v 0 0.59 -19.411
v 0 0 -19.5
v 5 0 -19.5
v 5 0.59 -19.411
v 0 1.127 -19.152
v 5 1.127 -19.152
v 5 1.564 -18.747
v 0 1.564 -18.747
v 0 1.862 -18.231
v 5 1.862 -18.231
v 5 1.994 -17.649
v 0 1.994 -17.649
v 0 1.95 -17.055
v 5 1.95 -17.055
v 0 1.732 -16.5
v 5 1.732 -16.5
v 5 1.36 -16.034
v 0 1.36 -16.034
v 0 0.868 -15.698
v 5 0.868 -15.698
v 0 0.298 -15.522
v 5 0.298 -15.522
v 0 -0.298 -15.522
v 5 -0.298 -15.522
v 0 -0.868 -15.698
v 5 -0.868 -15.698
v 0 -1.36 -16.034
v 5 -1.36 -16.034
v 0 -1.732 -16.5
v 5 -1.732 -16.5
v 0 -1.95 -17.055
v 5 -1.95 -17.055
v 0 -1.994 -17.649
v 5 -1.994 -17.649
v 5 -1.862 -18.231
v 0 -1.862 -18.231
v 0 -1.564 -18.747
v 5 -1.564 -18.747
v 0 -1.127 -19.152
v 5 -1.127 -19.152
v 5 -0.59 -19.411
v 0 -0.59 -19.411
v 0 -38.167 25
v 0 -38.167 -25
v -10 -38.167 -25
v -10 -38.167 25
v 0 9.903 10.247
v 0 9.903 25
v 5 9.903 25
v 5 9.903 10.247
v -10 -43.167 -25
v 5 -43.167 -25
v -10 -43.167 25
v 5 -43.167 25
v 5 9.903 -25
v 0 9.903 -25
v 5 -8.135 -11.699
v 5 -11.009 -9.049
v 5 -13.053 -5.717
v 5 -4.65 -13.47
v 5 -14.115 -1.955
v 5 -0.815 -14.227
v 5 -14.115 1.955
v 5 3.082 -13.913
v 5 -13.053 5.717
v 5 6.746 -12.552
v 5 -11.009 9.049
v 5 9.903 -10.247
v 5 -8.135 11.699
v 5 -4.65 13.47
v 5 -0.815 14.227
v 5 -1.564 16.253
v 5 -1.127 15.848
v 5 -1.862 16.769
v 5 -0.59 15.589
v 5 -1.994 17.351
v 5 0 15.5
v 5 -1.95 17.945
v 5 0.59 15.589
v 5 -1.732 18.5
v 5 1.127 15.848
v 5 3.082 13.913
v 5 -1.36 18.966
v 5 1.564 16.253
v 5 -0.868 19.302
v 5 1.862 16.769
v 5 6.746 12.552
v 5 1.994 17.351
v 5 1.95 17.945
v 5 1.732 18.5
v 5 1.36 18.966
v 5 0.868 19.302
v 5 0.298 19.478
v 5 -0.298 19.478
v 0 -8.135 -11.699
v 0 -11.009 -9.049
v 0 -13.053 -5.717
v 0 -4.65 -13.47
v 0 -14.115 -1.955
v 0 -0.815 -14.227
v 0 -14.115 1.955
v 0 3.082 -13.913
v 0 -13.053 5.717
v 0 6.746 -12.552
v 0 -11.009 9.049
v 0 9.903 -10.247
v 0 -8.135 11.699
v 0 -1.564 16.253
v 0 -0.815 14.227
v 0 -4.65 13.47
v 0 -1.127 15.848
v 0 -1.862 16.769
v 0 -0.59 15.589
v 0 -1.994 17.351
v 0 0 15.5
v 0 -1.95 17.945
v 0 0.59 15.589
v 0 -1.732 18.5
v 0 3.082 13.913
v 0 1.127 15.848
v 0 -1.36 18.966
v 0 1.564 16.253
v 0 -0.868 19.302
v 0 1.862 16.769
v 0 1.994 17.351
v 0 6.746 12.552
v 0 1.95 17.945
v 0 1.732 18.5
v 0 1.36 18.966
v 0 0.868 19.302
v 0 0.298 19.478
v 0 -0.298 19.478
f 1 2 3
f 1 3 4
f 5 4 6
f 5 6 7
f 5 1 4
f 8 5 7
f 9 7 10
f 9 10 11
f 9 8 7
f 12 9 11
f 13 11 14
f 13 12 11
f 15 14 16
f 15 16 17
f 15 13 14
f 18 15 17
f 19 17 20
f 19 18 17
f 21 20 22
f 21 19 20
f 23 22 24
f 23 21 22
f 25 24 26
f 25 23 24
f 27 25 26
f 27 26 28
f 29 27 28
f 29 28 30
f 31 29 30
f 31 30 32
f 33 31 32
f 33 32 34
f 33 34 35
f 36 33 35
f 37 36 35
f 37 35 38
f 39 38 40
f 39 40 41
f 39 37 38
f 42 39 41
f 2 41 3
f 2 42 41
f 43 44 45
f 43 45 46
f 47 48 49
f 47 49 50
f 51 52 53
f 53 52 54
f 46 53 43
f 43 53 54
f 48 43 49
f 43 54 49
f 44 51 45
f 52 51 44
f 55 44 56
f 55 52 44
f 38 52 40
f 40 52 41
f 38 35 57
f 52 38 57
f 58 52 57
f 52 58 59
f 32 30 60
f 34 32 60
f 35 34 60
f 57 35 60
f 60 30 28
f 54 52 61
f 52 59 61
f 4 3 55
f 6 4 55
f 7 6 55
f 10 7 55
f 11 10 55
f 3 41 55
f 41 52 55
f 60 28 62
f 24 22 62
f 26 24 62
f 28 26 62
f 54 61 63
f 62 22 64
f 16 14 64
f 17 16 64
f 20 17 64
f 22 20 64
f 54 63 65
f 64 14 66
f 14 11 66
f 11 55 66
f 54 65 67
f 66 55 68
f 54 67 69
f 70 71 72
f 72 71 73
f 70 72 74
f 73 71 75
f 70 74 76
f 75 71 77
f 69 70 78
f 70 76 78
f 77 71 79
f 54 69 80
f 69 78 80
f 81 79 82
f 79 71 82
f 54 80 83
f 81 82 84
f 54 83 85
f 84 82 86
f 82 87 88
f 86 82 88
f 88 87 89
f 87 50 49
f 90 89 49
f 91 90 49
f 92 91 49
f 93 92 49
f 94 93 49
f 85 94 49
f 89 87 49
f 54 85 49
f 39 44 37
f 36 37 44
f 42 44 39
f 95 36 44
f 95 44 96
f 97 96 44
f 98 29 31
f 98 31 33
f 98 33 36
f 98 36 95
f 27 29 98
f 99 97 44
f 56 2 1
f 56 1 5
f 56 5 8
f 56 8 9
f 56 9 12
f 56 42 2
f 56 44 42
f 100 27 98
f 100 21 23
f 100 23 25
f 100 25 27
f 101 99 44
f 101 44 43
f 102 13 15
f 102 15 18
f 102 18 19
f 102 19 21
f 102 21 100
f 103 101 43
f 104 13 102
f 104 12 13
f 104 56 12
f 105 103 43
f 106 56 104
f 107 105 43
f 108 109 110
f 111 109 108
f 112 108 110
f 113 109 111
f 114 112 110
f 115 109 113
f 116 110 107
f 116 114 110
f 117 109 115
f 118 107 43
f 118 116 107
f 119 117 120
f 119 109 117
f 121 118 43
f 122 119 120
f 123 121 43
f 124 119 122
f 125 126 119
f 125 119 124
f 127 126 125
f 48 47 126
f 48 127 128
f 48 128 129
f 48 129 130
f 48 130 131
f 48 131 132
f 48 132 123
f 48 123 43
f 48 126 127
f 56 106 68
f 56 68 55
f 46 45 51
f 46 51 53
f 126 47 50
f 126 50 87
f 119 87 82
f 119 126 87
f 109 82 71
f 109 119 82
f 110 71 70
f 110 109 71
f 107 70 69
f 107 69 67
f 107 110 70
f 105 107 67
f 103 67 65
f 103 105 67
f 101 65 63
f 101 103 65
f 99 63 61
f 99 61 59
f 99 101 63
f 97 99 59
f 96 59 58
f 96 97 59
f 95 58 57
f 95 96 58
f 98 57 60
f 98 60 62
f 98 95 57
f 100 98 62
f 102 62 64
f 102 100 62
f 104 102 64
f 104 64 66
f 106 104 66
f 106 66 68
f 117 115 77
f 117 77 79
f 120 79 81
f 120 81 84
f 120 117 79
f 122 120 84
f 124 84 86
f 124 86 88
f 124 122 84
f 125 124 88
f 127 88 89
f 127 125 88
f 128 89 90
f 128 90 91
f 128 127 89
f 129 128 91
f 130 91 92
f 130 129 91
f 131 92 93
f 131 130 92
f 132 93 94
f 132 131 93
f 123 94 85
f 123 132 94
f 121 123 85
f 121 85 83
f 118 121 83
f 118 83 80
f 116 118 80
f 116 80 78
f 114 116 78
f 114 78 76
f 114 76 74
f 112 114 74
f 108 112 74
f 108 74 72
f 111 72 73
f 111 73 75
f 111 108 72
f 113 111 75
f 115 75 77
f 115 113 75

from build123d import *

# Parameters (mm, degrees)
SKETCH_2_R      = 2
EXTRUDE_2_DEPTH = 5
SKETCH_4_W      = 50
SKETCH_4_H      = 5
EXTRUDE_3_DEPTH = 10


with BuildPart() as part:
    # 草图2 → 凸台-拉伸2 (new body)
    with BuildSketch(Plane(origin=(0, 0, 0), x_dir=(0, 0, -1), z_dir=(1, 0, 0))):
        with BuildLine():
            Line((-25, 9.903100775), (-10.246516239, 9.903100775))
            ThreePointArc((-10.246516239, 9.903100775), (0, -14.25), (10.246516239, 9.903100775))
            Line((10.246516239, 9.903100775), (25, 9.903100775))
            Line((25, 9.903100775), (25, -43.166899225))
            Line((25, -43.166899225), (-25, -43.166899225))
            Line((-25, -43.166899225), (-25, 9.903100775))
        make_face()
        with Locations((17.5, 0)):
            Circle(SKETCH_2_R, mode=Mode.SUBTRACT)
        with Locations((-17.5, 0)):
            Circle(SKETCH_2_R, mode=Mode.SUBTRACT)
    extrude(amount=EXTRUDE_2_DEPTH)

    # 草图4 → 凸台-拉伸3 (add)
    with BuildSketch(Plane.ZY):
        with Locations((0, -40.666899225)):
            Rectangle(SKETCH_4_W, SKETCH_4_H)
    extrude(amount=EXTRUDE_3_DEPTH)


solid = part.part
